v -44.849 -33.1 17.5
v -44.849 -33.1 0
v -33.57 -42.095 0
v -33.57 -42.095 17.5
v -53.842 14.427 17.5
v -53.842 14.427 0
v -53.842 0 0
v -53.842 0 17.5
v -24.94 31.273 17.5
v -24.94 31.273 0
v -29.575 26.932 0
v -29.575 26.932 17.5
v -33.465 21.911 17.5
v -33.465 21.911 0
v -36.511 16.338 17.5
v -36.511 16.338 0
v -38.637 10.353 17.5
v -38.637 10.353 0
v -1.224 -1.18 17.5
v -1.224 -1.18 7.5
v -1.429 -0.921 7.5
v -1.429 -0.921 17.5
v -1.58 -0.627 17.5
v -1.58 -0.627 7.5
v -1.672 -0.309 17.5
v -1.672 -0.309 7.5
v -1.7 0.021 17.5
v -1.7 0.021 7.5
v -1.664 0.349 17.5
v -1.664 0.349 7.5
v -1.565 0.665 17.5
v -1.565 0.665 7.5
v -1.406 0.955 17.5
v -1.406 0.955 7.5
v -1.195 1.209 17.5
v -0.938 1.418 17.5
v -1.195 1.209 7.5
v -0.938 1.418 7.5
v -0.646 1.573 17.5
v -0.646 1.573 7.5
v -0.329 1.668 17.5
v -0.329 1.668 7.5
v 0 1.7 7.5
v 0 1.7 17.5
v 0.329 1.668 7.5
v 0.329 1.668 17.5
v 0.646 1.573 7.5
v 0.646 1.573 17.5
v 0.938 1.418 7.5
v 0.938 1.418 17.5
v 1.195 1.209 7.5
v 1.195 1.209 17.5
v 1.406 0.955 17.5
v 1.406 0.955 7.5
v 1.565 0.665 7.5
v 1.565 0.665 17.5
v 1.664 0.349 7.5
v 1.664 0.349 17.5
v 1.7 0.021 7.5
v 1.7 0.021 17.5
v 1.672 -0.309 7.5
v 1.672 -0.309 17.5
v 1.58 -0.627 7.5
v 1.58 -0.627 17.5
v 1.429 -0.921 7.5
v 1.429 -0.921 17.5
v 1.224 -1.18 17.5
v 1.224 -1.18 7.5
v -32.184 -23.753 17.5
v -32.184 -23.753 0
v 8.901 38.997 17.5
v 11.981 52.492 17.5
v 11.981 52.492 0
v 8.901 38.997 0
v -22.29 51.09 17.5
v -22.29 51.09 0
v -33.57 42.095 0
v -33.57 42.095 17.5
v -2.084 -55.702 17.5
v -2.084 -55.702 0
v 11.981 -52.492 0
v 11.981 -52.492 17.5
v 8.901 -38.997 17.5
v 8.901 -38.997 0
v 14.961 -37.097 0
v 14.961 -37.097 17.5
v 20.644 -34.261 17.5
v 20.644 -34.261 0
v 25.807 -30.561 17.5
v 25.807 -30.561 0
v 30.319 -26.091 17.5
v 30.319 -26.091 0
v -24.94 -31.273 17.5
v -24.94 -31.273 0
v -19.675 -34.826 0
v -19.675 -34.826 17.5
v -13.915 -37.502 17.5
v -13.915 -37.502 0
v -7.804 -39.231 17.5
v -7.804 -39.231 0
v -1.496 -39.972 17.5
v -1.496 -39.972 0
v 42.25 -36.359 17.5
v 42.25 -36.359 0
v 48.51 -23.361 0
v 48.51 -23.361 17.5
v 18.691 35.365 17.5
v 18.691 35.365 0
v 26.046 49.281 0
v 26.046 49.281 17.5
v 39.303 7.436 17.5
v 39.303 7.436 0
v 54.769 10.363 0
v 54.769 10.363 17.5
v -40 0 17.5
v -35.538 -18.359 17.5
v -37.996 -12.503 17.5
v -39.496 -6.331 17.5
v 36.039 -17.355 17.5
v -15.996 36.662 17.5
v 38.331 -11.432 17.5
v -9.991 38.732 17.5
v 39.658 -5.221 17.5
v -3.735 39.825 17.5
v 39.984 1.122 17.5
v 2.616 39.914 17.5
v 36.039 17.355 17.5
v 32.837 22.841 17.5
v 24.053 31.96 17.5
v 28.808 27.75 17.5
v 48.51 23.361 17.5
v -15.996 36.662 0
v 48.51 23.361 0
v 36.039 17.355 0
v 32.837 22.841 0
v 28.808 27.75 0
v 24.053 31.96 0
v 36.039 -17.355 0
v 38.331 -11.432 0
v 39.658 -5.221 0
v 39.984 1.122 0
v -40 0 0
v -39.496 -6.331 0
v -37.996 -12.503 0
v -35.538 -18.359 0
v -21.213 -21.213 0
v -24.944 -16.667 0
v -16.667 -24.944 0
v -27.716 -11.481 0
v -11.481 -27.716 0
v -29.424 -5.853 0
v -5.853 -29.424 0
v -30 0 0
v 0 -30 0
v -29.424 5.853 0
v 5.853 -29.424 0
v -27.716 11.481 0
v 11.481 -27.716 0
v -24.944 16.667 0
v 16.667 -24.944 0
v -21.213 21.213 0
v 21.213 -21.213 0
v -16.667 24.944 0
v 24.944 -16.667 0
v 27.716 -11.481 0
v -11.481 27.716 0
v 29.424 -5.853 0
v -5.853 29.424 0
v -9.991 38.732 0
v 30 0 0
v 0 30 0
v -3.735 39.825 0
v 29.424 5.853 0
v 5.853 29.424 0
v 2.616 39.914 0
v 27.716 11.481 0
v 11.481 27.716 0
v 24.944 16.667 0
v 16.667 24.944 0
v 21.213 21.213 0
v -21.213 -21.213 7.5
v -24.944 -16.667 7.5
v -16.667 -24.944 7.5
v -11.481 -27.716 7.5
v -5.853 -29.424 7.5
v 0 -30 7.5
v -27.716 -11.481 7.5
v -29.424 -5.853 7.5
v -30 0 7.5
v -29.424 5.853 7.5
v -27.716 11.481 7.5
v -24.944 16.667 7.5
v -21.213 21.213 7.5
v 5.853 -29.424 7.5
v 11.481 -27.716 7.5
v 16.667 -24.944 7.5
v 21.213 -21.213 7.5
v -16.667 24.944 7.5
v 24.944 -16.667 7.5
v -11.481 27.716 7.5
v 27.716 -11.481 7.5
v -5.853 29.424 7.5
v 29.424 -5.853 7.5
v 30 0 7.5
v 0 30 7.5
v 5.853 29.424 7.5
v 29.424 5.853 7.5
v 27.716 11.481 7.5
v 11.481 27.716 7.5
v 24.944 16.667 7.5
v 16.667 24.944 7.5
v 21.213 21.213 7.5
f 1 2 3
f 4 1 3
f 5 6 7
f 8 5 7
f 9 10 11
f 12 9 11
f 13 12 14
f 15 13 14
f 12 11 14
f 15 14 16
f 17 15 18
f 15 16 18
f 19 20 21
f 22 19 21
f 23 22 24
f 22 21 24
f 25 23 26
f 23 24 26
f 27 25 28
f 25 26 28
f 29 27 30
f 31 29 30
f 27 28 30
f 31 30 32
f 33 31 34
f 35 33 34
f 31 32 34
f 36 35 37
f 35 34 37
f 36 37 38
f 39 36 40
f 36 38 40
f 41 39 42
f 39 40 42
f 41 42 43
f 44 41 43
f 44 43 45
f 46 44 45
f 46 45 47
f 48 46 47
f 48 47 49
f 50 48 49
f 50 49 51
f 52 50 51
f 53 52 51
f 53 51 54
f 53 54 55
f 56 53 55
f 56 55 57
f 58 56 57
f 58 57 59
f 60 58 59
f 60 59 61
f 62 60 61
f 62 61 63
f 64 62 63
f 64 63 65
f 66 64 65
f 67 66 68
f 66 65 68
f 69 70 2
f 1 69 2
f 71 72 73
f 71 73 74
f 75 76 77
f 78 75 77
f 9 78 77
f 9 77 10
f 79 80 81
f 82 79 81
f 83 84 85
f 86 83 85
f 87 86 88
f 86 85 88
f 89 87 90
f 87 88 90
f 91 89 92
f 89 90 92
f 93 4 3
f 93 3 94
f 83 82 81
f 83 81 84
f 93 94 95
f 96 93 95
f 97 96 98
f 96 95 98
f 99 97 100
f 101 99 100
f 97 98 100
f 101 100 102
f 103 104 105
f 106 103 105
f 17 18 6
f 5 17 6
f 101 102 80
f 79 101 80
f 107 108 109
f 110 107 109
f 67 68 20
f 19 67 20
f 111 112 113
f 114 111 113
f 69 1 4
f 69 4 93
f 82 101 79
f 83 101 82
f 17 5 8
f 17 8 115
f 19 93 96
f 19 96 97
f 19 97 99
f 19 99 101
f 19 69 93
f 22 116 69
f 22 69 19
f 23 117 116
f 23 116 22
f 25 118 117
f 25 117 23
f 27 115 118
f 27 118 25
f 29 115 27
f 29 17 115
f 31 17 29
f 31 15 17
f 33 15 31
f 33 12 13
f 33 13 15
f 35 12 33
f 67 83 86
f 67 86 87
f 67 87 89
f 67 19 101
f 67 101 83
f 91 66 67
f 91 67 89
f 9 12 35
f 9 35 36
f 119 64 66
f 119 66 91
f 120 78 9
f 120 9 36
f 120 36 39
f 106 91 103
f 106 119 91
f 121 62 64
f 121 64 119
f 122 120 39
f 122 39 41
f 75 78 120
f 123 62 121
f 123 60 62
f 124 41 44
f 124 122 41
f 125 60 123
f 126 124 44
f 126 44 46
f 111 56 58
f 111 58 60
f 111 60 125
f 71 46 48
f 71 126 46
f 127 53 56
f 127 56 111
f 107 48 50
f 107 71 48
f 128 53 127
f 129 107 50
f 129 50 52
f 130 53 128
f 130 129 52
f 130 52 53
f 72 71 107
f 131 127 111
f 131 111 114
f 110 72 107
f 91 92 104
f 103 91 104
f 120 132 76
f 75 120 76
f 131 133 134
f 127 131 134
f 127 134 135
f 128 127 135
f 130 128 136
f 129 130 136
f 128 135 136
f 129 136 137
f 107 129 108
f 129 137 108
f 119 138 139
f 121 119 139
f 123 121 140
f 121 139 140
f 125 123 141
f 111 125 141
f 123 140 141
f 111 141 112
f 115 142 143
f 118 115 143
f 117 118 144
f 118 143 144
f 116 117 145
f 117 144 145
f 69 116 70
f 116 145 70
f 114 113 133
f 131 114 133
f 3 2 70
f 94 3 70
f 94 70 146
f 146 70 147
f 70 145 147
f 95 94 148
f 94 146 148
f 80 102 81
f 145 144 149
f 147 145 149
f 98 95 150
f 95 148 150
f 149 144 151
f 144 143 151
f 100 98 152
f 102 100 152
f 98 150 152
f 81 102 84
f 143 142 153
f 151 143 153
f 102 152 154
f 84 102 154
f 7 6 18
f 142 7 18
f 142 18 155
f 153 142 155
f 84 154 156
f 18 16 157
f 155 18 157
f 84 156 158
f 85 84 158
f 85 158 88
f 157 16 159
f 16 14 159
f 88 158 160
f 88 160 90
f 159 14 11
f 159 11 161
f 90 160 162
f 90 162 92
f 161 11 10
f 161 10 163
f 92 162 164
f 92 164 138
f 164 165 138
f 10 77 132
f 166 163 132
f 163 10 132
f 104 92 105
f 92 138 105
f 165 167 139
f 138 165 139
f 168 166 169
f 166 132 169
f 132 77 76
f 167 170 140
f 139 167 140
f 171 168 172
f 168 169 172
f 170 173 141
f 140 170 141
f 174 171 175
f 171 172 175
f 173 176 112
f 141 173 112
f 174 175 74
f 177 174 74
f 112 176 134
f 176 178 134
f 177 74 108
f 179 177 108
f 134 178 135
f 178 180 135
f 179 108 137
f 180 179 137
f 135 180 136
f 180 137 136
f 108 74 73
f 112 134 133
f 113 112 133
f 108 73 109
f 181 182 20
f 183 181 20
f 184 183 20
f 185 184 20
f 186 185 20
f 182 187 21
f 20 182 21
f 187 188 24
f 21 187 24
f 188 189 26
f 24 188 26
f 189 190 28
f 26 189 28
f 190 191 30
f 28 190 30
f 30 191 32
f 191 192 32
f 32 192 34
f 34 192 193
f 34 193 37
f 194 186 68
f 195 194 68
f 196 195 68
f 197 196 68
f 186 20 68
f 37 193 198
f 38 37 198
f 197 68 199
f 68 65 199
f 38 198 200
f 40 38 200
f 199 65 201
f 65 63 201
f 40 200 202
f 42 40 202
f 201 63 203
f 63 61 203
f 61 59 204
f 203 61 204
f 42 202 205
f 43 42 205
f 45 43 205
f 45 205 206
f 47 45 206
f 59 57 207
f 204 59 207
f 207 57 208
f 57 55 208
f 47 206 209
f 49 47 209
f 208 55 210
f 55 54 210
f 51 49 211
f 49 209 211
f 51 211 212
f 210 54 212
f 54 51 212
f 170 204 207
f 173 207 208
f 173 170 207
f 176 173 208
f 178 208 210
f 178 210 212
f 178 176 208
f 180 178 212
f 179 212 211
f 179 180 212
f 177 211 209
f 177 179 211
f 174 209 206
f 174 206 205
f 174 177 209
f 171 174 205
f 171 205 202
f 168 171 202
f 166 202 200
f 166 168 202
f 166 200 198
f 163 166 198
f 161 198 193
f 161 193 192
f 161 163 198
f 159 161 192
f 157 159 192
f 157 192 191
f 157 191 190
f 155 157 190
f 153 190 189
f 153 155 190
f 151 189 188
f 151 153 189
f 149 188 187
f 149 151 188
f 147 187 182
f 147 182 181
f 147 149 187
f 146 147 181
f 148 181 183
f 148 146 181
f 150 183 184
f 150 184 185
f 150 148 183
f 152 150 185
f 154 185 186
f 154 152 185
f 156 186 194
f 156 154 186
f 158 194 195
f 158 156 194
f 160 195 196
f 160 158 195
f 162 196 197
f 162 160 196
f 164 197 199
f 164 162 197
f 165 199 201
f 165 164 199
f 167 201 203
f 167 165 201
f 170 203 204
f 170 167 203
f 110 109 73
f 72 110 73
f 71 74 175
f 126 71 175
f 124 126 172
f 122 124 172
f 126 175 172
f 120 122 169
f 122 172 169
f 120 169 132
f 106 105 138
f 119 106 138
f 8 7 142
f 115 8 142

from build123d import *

# Parameters (mm, degrees)
SKETCH1_R           = 40
BOSS_EXTRUDE1_DEPTH = 17.5
SHELL1_OUTLINE_R    = 30
SHELL1_DEPTH        = 7.5
CUT_EXTRUDE1_DEPTH  = 17.5


# Read off the part's stored shape, not the designer's step: Shell1
with BuildPart() as part:
    # Sketch1 → Boss-Extrude1 (new body)
    with BuildSketch(Plane.XY):
        Circle(SKETCH1_R)
        with BuildLine():
            Line((-53.841642229, 0), (-40, 0))
            ThreePointArc((-40, 0), (-39.657794455, 5.221047689), (-38.637033052, 10.352761804))
            Line((-38.637033052, 10.352761804), (-53.841642229, 14.426824554))
            Line((-53.841642229, 14.426824554), (-53.841642229, 0))
        make_face()
        with BuildLine():
            Line((-33.569714845, 42.095090962), (-24.939592074, 31.273259299))
            ThreePointArc((-24.939592074, 31.273259299), (-20.644250952, 34.260982219), (-15.995680973, 36.662490235))
            Line((-15.995680973, 36.662490235), (-22.290369216, 51.090068945))
            Line((-22.290369216, 51.090068945), (-33.569714845, 42.095090962))
        make_face()
        with BuildLine():
            Line((11.980892514, 52.491719847), (8.900837358, 38.997116487))
            ThreePointArc((8.900837358, 38.997116487), (13.914834583, 37.501698342), (18.690745131, 35.36461574))
            Line((18.690745131, 35.36461574), (26.046006457, 49.281449373))
            Line((26.046006457, 49.281449373), (11.980892514, 52.491719847))
        make_face()
        with BuildLine():
            Line((48.509643445, 23.36101305), (36.038754716, 17.355349565))
            ThreePointArc((36.038754716, 17.355349565), (37.995765867, 12.502870718), (39.302658929, 7.436464287))
            Line((39.302658929, 7.436464287), (54.769208026, 10.362893264))
            Line((54.769208026, 10.362893264), (48.509643445, 23.36101305))
        make_face()
        with BuildLine():
            ThreePointArc((36.038754716, -17.355349565), (33.46511048, -21.910873569), (30.318868926, -26.091496451))
            Line((30.318868926, -26.091496451), (42.250078864, -36.359132837))
            Line((42.250078864, -36.359132837), (48.509643445, -23.36101305))
            Line((48.509643445, -23.36101305), (36.038754716, -17.355349565))
        make_face()
        with BuildLine():
            ThreePointArc((8.900837358, -38.997116487), (3.734544338, -39.825283158), (-1.495647771, -39.972028192))
            Line((-1.495647771, -39.972028192), (-2.084221428, -55.70199032))
            Line((-2.084221428, -55.70199032), (11.980892514, -52.491719847))
            Line((11.980892514, -52.491719847), (8.900837358, -38.997116487))
        make_face()
        with BuildLine():
            ThreePointArc((-24.939592074, -31.273259299), (-28.808209861, -27.750442241), (-32.183911191, -23.752807423))
            Line((-32.183911191, -23.752807423), (-44.849060474, -33.100112979))
            Line((-44.849060474, -33.100112979), (-33.569714845, -42.095090962))
            Line((-33.569714845, -42.095090962), (-24.939592074, -31.273259299))
        make_face()
    extrude(amount=BOSS_EXTRUDE1_DEPTH)

    # Shell1 outline → Shell1 (cut)
    with BuildSketch(Plane.XY):
        Circle(SHELL1_OUTLINE_R)
    extrude(amount=SHELL1_DEPTH, mode=Mode.SUBTRACT)

    # Sketch2 → Cut-Extrude1 (cut)
    with BuildSketch(Plane(origin=(0, 0, 0), x_dir=(-1, 0, 0), z_dir=(0, 0, -1))):
        with BuildLine():
            Line((-1.223764683, -1.18), (1.223764683, -1.18))
            ThreePointArc((1.223764683, -1.18), (0, 1.7), (-1.223764683, -1.18))
        make_face()
    extrude(amount=-CUT_EXTRUDE1_DEPTH, mode=Mode.SUBTRACT)


solid = part.part
